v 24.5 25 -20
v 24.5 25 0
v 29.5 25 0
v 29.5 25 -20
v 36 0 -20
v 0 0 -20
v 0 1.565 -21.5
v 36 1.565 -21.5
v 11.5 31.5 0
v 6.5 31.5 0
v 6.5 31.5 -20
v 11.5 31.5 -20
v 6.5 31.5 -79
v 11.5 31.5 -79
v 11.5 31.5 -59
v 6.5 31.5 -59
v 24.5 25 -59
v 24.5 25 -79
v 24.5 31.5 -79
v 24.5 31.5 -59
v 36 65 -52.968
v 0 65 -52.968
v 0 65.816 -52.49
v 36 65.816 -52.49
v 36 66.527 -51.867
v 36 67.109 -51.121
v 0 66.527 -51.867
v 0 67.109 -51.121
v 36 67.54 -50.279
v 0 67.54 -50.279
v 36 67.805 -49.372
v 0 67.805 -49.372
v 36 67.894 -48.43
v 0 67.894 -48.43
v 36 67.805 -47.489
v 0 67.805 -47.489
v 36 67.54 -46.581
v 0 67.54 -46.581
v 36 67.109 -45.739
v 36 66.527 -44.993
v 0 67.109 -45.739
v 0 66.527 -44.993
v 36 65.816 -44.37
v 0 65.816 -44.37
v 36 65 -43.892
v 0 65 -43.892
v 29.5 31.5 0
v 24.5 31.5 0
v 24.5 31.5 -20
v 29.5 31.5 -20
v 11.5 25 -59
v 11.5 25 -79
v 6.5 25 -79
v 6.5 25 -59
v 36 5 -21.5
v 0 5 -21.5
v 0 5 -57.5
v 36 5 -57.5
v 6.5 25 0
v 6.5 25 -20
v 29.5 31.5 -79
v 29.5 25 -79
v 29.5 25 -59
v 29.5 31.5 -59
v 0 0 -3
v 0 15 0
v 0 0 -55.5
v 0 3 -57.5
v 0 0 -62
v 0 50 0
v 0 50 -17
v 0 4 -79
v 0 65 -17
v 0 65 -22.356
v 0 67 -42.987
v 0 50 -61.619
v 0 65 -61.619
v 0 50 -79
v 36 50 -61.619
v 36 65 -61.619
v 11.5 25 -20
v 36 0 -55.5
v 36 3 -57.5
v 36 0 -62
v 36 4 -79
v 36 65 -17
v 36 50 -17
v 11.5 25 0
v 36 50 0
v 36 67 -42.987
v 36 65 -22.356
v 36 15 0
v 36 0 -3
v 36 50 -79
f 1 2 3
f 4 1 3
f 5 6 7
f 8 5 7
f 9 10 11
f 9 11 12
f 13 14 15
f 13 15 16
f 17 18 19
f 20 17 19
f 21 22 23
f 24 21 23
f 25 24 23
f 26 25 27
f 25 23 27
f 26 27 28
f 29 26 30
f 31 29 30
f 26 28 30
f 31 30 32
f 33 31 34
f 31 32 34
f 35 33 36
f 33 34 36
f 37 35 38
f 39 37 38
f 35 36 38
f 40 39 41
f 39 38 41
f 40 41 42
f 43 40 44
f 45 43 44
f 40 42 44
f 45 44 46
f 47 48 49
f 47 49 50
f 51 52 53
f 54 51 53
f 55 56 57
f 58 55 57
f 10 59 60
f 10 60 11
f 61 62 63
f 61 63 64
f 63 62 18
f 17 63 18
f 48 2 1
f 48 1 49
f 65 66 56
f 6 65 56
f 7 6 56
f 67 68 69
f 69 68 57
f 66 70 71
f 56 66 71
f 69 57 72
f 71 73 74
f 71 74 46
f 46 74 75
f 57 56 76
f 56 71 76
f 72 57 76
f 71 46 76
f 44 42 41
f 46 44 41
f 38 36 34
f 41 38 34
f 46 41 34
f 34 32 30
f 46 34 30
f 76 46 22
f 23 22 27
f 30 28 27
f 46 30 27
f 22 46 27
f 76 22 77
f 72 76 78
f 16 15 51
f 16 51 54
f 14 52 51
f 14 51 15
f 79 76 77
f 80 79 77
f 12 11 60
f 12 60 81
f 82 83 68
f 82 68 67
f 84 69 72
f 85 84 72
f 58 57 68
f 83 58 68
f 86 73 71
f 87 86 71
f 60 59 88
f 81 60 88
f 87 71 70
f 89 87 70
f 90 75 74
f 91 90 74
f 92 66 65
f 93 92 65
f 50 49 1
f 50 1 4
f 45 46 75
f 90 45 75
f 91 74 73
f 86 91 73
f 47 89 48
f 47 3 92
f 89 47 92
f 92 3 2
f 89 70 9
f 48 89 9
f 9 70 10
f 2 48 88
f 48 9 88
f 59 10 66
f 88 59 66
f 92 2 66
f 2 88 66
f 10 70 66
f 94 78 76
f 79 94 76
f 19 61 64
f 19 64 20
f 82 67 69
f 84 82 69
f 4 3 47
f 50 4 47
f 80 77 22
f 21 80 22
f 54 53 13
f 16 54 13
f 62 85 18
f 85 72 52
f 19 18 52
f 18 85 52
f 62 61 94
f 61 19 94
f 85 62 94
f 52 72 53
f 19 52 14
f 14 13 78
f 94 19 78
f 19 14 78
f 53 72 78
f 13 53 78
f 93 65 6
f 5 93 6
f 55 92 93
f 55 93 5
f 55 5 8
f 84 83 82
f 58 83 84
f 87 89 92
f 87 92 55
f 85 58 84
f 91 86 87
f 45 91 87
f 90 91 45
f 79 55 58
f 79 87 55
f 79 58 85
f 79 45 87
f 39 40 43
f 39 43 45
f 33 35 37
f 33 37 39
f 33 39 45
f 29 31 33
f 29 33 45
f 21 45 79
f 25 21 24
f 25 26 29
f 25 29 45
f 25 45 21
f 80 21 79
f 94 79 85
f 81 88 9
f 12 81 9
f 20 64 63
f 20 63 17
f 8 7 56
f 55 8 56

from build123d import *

# Parameters (mm, degrees)
EXTRUDE_1_DEPTH     = 36
SKETCH_2_W          = 5
SKETCH_2_H          = 6.5
CUT_EXTRUDE_1_DEPTH = 20
SKETCH_3_W          = 5
SKETCH_3_H          = 6.5
CUT_EXTRUDE_2_DEPTH = 20


with BuildPart() as part:
    # Эскиз1 → Бобышка-Вытянуть1 (new body)
    with BuildSketch(Plane(origin=(0, 0, 0), x_dir=(0, 0, -1), z_dir=(1, 0, 0))):
        with BuildLine():
            Line((0, 15), (3, 0))
            Line((3, 0), (20, 0))
            Line((20, 0), (21.5, 1.565195477))
            Line((21.5, 1.565195477), (21.5, 5))
            Line((21.5, 5), (57.5, 5))
            Line((57.5, 5), (57.5, 3))
            Line((57.5, 3), (55.5, 0))
            Line((55.5, 0), (62, 0))
            Line((62, 0), (79, 4))
            Line((79, 4), (79, 50))
            Line((79, 50), (61.619424271, 50))
            Line((61.619424271, 50), (61.619424271, 65))
            Line((61.619424271, 65), (52.96803048, 65))
            ThreePointArc((52.96803048, 65), (48.430063355, 67.893872917), (43.892096231, 65))
            Line((43.892096231, 65), (42.98652577, 67))
            Line((42.98652577, 67), (22.355935477, 65))
            Line((22.355935477, 65), (17, 65))
            Line((17, 65), (17, 50))
            Line((17, 50), (0, 50))
            Line((0, 50), (0, 15))
        make_face()
    extrude(amount=EXTRUDE_1_DEPTH)

    # Эскиз2 → Вырез-Вытянуть1 (cut)
    with BuildSketch(Plane(origin=(0, 0, -79), x_dir=(-1, 0, 0), z_dir=(0, 0, -1))):
        with Locations((-27, 28.25)):
            Rectangle(SKETCH_2_W, SKETCH_2_H)
        with Locations((-9, 28.25)):
            Rectangle(SKETCH_2_W, SKETCH_2_H)
    extrude(amount=-CUT_EXTRUDE_1_DEPTH, mode=Mode.SUBTRACT)

    # Эскиз3 → Вырез-Вытянуть2 (cut)
    with BuildSketch(Plane.XY):
        with Locations((9, 28.25)):
            Rectangle(SKETCH_3_W, SKETCH_3_H)
        with Locations((27, 28.25)):
            Rectangle(SKETCH_3_W, SKETCH_3_H)
    extrude(amount=-CUT_EXTRUDE_2_DEPTH, mode=Mode.SUBTRACT)


solid = part.part
